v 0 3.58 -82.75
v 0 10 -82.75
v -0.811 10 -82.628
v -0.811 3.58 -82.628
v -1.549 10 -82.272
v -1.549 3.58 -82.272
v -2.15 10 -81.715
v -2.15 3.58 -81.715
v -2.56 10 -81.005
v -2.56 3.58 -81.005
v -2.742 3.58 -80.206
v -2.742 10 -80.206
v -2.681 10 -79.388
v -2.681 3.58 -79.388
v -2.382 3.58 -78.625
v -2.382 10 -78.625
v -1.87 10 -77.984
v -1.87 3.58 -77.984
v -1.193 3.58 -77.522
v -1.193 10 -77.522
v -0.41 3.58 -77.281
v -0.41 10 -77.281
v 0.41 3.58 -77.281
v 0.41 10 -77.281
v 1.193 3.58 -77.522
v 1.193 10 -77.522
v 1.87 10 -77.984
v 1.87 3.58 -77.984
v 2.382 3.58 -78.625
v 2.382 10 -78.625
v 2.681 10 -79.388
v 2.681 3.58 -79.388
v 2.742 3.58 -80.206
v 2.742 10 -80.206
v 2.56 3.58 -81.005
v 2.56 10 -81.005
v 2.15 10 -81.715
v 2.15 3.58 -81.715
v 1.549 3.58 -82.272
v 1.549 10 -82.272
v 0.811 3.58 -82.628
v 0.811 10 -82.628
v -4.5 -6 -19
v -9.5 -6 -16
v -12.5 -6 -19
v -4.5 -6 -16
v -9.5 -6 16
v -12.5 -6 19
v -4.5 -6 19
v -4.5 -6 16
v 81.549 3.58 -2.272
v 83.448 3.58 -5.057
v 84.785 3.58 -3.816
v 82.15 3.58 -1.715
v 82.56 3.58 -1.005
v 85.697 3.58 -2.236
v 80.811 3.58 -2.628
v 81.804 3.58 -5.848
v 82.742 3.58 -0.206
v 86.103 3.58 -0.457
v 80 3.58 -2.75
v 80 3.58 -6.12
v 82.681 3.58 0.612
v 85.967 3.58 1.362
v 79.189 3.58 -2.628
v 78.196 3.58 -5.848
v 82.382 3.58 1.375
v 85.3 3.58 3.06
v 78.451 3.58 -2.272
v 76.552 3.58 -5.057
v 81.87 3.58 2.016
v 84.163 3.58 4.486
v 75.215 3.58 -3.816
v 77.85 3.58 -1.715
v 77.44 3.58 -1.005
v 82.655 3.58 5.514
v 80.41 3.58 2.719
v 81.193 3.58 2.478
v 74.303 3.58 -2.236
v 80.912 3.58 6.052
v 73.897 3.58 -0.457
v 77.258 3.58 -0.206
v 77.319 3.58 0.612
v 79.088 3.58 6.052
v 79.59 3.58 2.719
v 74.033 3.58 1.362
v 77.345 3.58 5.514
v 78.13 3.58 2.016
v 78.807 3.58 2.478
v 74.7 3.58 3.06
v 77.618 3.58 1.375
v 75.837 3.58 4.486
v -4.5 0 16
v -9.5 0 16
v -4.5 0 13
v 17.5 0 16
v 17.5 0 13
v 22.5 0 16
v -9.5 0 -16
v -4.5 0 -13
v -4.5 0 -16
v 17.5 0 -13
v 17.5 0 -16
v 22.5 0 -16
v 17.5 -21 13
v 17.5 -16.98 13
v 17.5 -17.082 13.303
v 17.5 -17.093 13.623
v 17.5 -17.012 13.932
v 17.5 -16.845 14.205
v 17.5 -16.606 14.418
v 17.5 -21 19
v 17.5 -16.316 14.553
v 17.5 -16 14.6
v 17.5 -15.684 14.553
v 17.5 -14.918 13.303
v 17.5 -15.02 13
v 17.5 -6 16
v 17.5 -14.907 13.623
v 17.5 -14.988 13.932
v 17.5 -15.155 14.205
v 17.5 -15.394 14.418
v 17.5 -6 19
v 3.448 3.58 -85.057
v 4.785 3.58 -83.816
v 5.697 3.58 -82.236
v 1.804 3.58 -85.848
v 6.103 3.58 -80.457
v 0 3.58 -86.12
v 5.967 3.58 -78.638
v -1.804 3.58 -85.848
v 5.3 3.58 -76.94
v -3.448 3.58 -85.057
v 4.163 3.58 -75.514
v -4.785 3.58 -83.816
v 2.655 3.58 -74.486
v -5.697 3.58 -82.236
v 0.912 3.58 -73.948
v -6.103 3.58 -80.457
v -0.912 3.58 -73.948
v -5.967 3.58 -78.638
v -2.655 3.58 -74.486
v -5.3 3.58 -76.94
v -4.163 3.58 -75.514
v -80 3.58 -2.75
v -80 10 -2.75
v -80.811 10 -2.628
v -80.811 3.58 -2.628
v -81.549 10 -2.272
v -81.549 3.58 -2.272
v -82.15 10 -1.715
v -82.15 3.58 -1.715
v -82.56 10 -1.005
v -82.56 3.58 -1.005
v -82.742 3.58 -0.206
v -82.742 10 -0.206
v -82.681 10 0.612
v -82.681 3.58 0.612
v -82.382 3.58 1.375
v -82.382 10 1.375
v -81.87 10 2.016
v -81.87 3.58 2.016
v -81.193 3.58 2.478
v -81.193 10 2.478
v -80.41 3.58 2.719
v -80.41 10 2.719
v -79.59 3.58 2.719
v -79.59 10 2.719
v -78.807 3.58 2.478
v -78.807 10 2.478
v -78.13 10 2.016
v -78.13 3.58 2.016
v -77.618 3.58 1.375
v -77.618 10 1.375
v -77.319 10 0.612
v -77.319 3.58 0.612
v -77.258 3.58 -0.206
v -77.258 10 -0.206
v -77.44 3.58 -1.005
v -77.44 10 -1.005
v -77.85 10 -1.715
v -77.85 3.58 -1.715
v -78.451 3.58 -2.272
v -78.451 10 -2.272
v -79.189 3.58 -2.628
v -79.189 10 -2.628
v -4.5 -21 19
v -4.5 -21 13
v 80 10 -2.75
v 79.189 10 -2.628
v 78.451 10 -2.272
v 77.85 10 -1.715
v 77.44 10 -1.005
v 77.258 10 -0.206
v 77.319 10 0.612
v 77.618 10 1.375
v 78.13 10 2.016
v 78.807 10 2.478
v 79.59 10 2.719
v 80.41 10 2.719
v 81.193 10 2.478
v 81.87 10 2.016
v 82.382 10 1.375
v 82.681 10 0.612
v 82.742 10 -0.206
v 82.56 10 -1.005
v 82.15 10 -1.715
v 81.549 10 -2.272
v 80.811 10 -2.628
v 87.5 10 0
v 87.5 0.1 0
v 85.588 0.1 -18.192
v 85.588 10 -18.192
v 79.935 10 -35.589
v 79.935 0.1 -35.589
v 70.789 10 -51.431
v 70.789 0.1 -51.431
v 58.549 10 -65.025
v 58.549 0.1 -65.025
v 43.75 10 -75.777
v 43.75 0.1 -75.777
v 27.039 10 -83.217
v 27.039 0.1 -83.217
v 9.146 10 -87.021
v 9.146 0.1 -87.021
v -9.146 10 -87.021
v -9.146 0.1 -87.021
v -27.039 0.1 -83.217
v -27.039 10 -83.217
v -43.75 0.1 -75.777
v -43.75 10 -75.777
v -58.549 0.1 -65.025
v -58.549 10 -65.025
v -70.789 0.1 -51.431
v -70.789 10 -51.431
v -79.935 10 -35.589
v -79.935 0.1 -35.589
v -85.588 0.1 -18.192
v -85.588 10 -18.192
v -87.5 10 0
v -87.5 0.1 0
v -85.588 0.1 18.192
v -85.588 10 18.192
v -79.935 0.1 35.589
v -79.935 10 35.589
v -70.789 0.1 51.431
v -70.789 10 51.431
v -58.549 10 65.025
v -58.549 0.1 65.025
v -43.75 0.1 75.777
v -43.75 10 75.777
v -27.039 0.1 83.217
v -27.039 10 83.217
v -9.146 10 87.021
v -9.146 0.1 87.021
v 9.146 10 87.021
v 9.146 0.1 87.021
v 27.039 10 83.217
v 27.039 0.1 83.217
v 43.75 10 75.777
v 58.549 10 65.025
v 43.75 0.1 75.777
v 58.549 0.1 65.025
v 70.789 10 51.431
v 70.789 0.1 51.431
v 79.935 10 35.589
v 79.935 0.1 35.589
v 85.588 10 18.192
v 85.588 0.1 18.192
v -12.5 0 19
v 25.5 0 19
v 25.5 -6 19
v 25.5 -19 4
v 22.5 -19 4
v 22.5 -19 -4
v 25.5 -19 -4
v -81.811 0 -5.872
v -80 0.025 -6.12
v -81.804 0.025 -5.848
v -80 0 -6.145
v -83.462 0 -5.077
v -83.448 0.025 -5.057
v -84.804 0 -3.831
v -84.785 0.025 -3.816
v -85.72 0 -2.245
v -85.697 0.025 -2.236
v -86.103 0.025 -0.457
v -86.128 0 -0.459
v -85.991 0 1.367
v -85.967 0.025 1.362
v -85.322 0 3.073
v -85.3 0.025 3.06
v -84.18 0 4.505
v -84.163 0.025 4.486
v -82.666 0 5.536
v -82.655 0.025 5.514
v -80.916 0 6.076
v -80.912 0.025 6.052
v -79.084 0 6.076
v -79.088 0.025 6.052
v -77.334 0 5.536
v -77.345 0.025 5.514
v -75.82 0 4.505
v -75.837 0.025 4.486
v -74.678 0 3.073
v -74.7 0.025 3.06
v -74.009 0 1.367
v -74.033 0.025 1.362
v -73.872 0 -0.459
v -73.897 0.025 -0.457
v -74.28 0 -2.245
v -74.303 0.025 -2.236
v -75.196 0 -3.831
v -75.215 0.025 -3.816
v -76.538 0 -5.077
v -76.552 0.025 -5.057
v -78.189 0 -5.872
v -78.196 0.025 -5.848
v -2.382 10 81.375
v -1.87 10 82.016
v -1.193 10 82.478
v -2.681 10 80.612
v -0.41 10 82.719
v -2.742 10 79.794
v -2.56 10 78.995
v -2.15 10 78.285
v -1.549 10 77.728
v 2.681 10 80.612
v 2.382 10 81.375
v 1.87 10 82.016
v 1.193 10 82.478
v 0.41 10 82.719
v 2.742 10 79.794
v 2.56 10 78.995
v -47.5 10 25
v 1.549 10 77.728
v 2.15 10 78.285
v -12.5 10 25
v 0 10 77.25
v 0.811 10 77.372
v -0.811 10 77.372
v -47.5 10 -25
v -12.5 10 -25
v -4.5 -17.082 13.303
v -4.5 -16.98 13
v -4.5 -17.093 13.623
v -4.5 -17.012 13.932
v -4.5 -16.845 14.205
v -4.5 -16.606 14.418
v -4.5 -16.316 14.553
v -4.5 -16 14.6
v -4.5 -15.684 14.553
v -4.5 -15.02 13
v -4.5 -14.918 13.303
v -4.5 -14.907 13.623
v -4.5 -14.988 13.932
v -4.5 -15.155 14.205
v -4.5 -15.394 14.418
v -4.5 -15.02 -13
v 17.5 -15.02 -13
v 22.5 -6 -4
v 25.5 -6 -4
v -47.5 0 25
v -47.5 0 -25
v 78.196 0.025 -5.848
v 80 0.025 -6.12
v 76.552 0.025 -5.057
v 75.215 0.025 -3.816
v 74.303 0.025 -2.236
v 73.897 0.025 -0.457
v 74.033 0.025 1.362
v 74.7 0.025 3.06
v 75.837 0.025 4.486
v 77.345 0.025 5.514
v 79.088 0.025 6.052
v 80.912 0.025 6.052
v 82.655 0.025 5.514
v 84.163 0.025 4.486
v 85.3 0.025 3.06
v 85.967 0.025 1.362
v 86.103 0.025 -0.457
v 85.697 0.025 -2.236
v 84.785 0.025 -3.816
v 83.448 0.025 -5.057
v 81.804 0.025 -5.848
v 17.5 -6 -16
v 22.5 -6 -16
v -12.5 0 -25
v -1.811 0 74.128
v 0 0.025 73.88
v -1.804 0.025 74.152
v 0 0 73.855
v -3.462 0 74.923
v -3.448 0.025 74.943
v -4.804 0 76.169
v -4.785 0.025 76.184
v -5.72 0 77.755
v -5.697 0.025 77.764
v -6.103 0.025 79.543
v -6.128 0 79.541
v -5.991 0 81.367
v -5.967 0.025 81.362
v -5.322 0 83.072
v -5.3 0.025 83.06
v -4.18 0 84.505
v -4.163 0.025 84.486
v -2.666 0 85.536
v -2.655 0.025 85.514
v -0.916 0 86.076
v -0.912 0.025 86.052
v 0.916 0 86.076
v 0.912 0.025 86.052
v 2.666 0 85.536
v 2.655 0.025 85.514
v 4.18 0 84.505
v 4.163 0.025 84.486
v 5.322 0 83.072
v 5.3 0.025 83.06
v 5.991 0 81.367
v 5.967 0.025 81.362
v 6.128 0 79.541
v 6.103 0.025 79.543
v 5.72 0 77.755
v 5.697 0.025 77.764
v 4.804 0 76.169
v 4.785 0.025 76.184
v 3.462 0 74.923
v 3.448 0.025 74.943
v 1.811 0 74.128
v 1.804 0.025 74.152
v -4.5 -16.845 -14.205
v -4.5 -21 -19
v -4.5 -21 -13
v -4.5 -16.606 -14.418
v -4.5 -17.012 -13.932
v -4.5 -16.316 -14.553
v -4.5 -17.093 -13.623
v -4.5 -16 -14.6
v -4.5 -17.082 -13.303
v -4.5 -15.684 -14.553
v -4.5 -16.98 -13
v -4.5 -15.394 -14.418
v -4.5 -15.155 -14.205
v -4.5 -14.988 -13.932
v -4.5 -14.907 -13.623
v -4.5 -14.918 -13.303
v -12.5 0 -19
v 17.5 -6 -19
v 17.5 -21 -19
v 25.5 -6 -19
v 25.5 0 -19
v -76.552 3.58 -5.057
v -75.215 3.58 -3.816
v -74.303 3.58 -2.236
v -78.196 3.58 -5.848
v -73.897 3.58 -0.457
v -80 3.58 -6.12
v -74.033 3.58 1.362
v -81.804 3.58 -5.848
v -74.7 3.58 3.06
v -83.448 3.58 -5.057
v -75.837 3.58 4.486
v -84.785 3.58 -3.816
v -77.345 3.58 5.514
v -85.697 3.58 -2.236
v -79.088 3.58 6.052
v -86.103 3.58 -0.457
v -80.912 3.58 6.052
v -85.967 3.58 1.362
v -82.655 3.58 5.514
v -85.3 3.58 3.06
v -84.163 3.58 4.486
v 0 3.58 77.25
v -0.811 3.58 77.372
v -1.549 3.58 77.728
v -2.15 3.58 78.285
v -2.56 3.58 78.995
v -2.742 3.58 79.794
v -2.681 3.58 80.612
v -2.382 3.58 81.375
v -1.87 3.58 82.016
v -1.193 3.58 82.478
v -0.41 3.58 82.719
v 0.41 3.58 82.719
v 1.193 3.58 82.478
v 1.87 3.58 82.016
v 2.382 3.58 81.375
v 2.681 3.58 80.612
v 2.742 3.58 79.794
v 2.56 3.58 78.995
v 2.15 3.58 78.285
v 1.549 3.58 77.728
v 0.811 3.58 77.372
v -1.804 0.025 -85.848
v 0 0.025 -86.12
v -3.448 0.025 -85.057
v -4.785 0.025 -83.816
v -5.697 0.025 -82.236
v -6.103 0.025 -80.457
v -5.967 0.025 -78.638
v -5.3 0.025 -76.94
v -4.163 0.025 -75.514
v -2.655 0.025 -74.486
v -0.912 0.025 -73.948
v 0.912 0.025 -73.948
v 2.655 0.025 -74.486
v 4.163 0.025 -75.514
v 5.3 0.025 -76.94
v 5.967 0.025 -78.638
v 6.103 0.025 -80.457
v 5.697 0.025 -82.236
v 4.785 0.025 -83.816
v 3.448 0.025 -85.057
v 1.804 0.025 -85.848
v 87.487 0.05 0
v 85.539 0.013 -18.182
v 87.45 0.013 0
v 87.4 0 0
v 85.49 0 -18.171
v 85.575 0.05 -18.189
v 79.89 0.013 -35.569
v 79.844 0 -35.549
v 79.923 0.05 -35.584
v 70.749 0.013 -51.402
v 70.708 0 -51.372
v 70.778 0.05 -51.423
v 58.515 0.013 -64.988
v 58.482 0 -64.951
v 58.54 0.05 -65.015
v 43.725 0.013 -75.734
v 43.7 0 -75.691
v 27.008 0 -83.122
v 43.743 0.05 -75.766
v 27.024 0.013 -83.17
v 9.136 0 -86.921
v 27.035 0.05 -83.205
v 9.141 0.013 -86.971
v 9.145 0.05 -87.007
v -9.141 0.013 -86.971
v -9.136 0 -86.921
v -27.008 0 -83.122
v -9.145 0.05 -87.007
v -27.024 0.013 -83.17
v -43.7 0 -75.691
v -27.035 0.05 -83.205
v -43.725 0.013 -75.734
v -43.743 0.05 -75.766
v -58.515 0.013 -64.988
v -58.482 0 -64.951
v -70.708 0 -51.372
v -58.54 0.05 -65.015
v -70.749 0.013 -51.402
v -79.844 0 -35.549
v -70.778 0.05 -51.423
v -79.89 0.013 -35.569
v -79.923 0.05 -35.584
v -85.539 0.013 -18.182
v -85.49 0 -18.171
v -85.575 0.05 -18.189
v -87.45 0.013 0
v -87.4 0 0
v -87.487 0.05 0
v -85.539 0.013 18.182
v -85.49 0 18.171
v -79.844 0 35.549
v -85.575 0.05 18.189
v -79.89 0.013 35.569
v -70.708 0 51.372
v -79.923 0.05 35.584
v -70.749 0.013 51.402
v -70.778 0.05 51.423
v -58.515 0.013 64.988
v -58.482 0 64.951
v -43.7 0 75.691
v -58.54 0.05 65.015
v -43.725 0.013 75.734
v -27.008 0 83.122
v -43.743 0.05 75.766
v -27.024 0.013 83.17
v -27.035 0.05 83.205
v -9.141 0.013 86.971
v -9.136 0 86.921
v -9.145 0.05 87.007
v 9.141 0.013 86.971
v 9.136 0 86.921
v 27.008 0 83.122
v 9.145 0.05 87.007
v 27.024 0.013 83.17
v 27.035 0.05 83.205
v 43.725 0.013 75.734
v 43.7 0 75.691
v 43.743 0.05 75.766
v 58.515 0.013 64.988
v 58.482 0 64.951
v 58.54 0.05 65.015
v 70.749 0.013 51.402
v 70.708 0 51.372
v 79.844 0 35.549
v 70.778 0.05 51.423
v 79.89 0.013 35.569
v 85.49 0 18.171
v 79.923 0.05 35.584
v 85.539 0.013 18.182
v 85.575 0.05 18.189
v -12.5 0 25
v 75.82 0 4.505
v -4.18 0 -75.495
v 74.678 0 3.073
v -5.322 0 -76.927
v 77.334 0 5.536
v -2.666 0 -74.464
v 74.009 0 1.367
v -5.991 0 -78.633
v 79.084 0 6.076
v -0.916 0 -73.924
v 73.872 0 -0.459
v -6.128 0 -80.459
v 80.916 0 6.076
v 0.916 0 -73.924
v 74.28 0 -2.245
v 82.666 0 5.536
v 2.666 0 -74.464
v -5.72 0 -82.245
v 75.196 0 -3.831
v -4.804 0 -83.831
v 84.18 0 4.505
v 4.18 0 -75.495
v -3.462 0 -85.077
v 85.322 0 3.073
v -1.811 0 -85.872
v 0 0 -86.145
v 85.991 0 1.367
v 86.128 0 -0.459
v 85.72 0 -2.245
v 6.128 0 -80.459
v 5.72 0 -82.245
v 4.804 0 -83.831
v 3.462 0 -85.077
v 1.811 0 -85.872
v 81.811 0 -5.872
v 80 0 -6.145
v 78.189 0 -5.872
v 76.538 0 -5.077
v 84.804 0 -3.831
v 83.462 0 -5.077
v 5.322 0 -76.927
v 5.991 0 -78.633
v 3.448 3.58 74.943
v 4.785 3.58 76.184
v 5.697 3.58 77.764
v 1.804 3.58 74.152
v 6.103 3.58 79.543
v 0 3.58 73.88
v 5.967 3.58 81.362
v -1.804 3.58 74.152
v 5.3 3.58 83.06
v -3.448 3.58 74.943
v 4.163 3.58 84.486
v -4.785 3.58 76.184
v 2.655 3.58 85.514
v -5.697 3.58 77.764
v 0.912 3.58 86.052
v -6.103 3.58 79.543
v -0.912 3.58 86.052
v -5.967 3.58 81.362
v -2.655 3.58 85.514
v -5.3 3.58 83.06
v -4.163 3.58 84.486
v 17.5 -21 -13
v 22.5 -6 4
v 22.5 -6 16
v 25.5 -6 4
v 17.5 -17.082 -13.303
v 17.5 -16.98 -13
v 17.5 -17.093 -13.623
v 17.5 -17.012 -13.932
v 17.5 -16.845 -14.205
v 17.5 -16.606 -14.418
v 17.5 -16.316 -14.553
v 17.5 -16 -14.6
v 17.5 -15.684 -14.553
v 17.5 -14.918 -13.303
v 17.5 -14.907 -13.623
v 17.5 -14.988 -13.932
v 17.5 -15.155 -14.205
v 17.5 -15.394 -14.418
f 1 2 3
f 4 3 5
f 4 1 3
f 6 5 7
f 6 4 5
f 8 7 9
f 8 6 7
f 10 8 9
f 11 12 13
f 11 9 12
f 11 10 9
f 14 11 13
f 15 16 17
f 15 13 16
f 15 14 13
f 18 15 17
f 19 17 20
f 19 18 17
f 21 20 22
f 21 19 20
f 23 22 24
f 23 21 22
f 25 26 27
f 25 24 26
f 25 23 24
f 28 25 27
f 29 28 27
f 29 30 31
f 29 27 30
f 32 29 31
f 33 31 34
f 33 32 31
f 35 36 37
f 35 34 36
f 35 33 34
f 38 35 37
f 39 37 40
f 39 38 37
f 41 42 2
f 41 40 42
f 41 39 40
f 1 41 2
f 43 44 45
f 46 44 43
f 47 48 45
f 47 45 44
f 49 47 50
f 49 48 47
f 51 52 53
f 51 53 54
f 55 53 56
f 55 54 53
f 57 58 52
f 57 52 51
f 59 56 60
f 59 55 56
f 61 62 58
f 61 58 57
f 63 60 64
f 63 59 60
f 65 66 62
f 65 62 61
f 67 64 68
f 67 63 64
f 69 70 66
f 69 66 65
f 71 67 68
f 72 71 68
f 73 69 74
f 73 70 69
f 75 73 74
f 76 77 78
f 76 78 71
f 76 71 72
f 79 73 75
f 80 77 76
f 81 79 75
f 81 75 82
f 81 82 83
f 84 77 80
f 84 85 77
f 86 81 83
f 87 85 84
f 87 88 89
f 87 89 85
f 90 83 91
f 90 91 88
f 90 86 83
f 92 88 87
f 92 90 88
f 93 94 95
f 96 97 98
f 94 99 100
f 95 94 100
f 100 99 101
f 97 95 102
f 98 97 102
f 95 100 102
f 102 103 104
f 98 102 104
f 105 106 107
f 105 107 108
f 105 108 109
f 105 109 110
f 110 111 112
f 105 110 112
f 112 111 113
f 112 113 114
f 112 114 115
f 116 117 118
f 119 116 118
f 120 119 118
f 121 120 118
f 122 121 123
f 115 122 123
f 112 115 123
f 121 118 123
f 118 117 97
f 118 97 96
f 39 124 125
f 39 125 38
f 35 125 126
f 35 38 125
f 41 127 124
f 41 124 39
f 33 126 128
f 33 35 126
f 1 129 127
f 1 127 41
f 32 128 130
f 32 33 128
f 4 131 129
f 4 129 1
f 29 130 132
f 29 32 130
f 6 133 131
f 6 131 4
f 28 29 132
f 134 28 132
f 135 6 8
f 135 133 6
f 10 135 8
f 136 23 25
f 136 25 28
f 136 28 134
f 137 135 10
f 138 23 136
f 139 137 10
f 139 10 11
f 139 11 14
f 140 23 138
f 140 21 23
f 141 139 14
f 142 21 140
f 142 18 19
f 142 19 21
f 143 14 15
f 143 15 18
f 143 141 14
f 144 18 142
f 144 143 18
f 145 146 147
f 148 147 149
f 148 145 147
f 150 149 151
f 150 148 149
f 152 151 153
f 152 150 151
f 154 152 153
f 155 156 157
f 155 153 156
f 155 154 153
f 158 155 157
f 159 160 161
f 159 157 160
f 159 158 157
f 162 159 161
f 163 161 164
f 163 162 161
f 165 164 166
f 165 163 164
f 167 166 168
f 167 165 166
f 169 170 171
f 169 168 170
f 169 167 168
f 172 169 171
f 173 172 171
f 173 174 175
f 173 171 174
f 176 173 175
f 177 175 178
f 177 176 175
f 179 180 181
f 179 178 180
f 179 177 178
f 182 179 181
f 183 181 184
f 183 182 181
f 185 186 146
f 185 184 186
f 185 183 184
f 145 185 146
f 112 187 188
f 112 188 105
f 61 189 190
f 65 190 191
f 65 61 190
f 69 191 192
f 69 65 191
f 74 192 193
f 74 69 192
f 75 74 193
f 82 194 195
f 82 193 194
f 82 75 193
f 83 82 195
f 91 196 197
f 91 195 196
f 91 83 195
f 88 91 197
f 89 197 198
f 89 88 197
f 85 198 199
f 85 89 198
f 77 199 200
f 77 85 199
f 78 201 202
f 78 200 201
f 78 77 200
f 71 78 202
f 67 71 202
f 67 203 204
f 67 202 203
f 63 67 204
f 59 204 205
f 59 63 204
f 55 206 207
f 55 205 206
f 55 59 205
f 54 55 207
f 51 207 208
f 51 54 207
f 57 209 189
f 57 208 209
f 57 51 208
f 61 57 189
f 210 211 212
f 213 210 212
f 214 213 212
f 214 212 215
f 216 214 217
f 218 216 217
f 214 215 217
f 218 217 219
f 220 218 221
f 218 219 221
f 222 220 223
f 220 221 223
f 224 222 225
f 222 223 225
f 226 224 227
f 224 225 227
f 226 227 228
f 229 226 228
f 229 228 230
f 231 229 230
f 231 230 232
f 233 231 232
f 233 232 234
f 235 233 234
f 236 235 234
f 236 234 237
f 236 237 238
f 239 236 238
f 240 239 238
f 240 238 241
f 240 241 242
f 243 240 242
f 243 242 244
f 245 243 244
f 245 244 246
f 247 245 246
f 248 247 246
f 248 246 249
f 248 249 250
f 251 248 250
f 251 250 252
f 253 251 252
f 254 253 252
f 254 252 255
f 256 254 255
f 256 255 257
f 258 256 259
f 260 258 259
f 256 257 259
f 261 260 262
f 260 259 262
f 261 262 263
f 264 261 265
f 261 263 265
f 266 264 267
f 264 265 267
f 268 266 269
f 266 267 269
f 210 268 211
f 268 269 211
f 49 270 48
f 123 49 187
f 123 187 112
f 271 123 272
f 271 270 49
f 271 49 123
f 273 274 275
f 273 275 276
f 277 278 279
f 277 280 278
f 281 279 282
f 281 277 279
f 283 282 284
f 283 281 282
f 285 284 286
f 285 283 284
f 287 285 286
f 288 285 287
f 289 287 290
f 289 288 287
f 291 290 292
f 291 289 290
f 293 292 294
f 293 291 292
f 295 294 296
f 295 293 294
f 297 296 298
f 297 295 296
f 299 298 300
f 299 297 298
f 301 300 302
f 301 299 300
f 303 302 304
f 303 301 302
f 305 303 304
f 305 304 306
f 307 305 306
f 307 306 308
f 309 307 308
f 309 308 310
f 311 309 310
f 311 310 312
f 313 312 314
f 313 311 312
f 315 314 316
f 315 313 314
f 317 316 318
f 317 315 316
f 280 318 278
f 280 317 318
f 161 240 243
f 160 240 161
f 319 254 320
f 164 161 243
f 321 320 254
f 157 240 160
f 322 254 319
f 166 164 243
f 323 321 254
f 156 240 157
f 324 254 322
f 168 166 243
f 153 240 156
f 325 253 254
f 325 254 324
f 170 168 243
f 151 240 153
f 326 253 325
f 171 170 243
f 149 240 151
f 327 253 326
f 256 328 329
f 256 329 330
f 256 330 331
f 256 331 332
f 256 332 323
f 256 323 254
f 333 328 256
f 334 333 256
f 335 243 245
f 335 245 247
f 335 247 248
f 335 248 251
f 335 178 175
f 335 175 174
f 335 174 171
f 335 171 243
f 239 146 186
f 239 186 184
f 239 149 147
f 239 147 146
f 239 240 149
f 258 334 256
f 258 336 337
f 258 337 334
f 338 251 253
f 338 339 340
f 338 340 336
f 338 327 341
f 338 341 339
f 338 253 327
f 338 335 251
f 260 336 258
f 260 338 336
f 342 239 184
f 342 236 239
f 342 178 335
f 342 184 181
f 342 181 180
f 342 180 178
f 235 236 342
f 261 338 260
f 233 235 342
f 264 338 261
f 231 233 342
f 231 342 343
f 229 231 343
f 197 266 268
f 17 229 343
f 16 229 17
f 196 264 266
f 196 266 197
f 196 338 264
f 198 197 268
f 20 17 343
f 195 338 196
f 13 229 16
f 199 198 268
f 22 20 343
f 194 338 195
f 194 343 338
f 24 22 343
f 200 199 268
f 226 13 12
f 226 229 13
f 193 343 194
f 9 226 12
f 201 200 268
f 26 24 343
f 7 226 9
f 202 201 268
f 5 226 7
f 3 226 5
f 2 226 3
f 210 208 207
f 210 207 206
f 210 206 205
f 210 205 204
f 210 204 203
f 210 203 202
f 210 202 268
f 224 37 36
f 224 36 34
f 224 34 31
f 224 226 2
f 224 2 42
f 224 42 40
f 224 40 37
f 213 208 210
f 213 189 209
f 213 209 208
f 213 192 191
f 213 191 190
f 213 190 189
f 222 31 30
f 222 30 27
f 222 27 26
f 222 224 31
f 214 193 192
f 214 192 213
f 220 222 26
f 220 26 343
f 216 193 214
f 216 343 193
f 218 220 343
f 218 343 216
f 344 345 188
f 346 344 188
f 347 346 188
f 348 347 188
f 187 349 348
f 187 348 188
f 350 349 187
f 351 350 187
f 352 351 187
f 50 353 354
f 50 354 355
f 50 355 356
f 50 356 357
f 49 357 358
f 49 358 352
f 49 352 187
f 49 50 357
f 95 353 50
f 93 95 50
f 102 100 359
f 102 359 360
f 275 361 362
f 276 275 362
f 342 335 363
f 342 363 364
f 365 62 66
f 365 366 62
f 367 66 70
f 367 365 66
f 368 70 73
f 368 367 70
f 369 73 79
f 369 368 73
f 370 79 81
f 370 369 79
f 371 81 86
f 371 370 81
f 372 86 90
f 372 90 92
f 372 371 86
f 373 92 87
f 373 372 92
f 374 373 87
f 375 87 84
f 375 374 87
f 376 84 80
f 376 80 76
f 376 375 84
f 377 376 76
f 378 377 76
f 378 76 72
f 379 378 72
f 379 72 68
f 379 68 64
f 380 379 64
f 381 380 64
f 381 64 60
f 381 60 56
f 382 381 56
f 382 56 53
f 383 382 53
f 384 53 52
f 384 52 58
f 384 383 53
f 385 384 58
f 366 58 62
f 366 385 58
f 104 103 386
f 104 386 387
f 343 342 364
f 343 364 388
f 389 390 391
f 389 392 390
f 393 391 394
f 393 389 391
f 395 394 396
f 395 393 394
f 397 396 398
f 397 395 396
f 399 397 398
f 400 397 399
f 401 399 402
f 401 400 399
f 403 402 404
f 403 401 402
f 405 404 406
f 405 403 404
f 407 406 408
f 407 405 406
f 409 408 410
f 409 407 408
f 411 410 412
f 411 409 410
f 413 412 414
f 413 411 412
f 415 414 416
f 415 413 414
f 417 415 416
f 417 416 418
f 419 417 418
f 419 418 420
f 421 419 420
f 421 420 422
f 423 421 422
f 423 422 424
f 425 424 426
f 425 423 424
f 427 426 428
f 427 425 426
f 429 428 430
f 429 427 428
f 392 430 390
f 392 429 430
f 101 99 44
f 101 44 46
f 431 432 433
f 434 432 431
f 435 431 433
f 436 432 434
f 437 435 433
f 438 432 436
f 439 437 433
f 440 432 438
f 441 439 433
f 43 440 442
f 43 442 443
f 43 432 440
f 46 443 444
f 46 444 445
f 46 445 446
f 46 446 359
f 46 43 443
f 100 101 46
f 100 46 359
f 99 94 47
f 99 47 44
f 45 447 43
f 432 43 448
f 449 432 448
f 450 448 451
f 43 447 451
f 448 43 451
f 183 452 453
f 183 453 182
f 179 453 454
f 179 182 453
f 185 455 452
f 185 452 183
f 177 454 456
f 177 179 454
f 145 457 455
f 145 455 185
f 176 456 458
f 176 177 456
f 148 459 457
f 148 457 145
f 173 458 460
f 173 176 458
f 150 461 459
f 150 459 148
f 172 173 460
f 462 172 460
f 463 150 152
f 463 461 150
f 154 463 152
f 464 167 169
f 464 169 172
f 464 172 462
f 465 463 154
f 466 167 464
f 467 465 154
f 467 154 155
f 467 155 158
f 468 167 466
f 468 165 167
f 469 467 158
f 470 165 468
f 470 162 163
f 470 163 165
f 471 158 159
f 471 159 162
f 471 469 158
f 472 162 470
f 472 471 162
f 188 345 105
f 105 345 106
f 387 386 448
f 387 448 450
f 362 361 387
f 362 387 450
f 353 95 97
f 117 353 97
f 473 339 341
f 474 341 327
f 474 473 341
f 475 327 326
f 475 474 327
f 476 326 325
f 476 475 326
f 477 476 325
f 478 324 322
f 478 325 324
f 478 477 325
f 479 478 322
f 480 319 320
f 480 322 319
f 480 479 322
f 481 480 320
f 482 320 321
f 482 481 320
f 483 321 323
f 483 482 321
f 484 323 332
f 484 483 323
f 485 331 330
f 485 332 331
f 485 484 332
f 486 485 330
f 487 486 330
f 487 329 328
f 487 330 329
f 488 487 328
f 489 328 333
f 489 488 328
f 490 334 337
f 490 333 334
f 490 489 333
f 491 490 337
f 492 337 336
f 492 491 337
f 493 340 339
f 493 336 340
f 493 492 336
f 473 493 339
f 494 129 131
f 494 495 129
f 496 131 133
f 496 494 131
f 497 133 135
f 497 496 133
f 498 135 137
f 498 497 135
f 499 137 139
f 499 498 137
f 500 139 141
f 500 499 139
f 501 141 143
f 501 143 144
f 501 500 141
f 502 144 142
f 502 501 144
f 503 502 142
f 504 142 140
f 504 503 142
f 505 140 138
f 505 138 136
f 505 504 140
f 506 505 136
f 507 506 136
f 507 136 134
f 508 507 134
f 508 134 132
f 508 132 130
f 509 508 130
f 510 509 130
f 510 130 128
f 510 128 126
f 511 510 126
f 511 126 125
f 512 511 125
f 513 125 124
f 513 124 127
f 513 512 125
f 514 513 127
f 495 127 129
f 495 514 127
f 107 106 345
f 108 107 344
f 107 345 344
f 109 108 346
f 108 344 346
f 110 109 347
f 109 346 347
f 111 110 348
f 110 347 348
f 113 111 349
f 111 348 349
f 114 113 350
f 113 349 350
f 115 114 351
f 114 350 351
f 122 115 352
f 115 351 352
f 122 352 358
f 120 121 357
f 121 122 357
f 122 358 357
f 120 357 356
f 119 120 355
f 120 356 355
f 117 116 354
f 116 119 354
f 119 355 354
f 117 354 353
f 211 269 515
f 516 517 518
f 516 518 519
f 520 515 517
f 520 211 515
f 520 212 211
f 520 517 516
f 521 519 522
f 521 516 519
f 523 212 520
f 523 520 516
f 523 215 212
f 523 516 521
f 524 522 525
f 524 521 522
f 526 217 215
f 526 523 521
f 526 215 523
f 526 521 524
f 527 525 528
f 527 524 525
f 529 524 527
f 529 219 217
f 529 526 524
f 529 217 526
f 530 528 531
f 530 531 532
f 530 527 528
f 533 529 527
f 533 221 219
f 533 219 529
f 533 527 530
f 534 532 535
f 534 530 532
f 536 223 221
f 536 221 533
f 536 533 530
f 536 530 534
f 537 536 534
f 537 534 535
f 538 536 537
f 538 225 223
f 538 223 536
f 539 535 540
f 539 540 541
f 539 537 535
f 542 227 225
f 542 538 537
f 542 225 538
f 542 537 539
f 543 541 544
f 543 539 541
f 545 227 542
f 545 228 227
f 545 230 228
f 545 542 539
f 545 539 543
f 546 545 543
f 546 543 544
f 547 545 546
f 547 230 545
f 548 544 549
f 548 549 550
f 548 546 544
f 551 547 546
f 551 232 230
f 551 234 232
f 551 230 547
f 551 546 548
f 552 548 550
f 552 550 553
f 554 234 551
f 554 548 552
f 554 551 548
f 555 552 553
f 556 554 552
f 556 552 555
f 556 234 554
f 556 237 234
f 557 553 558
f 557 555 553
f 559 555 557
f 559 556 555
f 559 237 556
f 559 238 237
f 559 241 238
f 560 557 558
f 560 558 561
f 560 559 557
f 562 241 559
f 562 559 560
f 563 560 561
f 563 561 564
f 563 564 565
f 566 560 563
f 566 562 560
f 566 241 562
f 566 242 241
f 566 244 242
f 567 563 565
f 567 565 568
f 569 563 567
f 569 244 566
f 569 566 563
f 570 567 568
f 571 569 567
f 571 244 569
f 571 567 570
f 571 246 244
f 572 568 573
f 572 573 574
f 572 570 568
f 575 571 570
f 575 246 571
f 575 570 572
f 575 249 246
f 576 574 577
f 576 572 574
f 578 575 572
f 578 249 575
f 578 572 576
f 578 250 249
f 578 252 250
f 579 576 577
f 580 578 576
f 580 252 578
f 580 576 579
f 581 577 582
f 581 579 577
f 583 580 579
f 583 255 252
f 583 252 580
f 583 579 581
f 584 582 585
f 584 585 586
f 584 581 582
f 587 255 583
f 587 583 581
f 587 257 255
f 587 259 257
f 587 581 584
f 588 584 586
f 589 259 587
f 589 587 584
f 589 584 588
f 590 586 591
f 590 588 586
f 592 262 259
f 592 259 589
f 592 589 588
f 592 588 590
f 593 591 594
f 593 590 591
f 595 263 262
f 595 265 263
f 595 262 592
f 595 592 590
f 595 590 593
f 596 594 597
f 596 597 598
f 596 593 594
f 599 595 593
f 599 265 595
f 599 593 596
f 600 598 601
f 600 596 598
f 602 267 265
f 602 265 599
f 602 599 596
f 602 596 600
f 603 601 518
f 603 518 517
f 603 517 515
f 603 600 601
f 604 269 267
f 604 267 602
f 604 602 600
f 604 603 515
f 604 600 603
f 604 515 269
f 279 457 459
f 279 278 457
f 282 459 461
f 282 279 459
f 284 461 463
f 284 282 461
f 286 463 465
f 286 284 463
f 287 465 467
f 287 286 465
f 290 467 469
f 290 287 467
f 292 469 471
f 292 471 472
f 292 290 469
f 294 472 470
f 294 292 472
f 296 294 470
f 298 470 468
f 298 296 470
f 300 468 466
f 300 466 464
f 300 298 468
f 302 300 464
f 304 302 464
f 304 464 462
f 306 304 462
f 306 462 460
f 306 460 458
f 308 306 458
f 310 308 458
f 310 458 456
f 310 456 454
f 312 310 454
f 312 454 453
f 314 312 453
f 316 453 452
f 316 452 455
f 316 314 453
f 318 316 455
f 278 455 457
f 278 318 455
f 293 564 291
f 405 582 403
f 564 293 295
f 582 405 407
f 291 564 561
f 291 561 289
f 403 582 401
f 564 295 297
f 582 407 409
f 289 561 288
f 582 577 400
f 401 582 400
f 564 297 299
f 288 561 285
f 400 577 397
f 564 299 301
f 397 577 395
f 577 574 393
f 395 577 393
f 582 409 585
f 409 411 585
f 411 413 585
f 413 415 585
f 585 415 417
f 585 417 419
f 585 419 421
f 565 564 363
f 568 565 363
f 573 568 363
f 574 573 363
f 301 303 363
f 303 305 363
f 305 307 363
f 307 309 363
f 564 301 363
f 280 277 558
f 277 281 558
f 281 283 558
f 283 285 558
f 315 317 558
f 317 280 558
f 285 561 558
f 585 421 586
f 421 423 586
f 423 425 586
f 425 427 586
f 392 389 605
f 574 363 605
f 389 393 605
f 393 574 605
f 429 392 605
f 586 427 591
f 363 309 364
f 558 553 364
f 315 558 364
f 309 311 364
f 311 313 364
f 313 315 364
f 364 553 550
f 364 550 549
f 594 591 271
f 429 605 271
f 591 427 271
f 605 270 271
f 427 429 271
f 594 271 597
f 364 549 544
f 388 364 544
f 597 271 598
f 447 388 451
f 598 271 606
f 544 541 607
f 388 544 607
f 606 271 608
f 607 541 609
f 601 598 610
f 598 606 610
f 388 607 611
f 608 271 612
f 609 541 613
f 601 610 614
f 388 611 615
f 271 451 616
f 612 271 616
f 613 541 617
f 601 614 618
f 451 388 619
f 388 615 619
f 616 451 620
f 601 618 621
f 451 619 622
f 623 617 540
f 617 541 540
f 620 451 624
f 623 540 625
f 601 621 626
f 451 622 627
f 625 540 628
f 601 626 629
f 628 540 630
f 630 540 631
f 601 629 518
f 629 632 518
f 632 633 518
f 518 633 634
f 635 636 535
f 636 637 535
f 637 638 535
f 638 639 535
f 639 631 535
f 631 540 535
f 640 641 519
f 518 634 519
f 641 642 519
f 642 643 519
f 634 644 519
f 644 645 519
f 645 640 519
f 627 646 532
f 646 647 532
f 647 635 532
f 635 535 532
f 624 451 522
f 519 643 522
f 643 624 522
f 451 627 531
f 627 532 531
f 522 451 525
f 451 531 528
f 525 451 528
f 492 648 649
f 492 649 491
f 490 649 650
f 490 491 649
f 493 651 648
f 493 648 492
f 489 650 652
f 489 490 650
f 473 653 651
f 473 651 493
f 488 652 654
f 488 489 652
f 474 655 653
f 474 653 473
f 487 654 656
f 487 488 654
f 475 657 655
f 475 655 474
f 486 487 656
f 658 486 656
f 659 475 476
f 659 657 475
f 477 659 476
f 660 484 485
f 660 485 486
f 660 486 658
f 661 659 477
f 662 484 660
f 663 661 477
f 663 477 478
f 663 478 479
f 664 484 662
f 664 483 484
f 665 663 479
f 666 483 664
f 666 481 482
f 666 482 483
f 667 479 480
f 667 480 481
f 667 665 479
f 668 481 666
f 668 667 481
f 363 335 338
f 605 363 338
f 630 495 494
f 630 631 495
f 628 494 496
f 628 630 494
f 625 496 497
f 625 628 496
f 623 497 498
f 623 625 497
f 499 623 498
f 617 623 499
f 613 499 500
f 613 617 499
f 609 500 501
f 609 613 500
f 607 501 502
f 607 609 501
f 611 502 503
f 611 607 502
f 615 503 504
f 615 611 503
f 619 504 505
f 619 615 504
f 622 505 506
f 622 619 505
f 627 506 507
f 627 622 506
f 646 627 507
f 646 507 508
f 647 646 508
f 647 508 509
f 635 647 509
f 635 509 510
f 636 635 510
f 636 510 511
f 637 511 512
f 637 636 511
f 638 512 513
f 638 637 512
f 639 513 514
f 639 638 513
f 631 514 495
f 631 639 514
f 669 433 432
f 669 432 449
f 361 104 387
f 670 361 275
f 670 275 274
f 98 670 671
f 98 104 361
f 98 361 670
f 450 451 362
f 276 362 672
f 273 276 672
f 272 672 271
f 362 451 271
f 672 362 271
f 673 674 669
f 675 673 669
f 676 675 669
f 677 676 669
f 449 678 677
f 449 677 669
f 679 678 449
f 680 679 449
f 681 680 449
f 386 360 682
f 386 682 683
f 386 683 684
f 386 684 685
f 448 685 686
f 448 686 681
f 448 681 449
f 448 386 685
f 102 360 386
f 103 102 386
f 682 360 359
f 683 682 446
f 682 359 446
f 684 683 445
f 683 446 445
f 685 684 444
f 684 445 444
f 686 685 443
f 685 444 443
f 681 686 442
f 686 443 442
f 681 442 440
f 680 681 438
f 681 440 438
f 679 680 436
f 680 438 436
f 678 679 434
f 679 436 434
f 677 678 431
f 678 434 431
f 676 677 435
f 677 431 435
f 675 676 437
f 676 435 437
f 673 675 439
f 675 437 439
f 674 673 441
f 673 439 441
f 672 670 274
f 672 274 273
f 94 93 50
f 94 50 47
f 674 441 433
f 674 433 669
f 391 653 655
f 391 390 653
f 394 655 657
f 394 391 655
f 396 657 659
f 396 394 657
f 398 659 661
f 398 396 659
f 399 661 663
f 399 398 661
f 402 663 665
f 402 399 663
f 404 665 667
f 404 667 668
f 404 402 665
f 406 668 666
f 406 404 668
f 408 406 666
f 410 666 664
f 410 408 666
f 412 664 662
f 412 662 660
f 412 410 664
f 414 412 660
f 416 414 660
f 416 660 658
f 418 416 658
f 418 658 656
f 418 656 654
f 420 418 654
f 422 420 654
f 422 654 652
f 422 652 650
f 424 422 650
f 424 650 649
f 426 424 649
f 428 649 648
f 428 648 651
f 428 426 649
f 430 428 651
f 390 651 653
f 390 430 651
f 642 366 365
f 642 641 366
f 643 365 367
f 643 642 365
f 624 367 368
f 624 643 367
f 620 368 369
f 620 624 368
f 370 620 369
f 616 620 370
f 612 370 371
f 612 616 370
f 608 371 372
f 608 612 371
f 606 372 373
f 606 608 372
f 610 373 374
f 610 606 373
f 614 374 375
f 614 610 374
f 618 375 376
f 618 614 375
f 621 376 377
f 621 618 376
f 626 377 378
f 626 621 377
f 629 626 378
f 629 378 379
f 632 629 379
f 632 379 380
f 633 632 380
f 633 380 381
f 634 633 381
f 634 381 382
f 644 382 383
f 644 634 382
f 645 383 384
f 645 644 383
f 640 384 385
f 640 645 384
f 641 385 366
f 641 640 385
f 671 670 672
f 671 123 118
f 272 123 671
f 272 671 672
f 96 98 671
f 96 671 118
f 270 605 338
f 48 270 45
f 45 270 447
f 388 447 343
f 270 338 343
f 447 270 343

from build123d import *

# Parameters (mm, degrees)
SKETCH1_R                              = 87.5
BOSS_EXTRUDE1_DEPTH                    = 10
SKETCH2_R                              = 7.5
BOSS_EXTRUDE2_DEPTH                    = 80
CBORE_FOR_M5_HEX_HEAD_BOLT1_AT_2_COUNT = 2
CBORE_FOR_M5_HEX_HEAD_BOLT1_AT_2_PITCH = 113.13708499
CBORE_FOR_M5_HEX_HEAD_BOLT1_AT_3_COUNT = 2
CBORE_FOR_M5_HEX_HEAD_BOLT1_AT_3_PITCH = 160
CBORE_FOR_M5_HEX_HEAD_BOLT1_AT_4_COUNT = 2
CBORE_FOR_M5_HEX_HEAD_BOLT1_AT_4_PITCH = 113.13708499
SKETCH5_R                              = 87.5
CUT_EXTRUDE1_DEPTH                     = 80
FILLET1_R                              = 0.1
SKETCH10_W                             = 35
SKETCH10_H                             = 50
CUT_EXTRUDE3_DEPTH                     = 23
SKETCH12_W                             = 38
SKETCH12_H                             = 38
BOSS_EXTRUDE3_DEPTH                    = 6
SKETCH13_W                             = 22
SKETCH13_H                             = 6
BOSS_EXTRUDE4_DEPTH                    = 15
SKETCH14_W                             = 3
SKETCH14_H                             = 8
BOSS_EXTRUDE5_DEPTH                    = 13
CUT_EXTRUDE4_DEPTH                     = 93.0000001


with BuildPart() as part:
    # Sketch1 → Boss-Extrude1 (new body)
    with BuildSketch(Plane(origin=(0, 0, 0), x_dir=(1, 0, 0), z_dir=(0, 1, 0))):
        Circle(SKETCH1_R)
    extrude(amount=BOSS_EXTRUDE1_DEPTH)

    # Sketch2 → Boss-Extrude2 (add)
    with BuildSketch(Plane(origin=(0, 10, 0), x_dir=(1, 0, 0), z_dir=(0, 1, 0))):
        with Locations((0, -80)):
            Circle(SKETCH2_R)
        with Locations((-80, 0)):
            Circle(SKETCH2_R)
        with Locations((0, 80)):
            Circle(SKETCH2_R)
        with Locations((80, 0)):
            Circle(SKETCH2_R)
    extrude(amount=BOSS_EXTRUDE2_DEPTH)

    # Sketch4 → CBORE for M5 Hex Head Bolt1 (revolve, cut)
    with BuildSketch(Plane(origin=(80, 0, 0), x_dir=(0, 0, -1), z_dir=(1, 0, 0))):
        Polygon((0, 0), (0, 21.652366702), (2.75, 20), (2.75, 3.58), (6.12, 3.58), (6.12, 0.025), (6.145, 0), align=None)
    cbore_for_m5_hex_head_bolt1 = revolve(axis=Axis((80, -6.35, 0), (0, 1, 0)), mode=Mode.SUBTRACT)

    # CBORE for M5 Hex Head Bolt1 at 2: CBORE for M5 Hex Head Bolt1 ×2
    with Locations(*[Vector(-0.707106781, 0, -0.707106781) * (i * CBORE_FOR_M5_HEX_HEAD_BOLT1_AT_2_PITCH) for i in range(1, CBORE_FOR_M5_HEX_HEAD_BOLT1_AT_2_COUNT)]):
        add(cbore_for_m5_hex_head_bolt1, mode=Mode.SUBTRACT)

    # CBORE for M5 Hex Head Bolt1 at 3: CBORE for M5 Hex Head Bolt1 ×2
    with Locations(*[(-i * CBORE_FOR_M5_HEX_HEAD_BOLT1_AT_3_PITCH, 0, 0) for i in range(1, CBORE_FOR_M5_HEX_HEAD_BOLT1_AT_3_COUNT)]):
        add(cbore_for_m5_hex_head_bolt1, mode=Mode.SUBTRACT)

    # CBORE for M5 Hex Head Bolt1 at 4: CBORE for M5 Hex Head Bolt1 ×2
    with Locations(*[Vector(-0.707106781, 0, 0.707106781) * (i * CBORE_FOR_M5_HEX_HEAD_BOLT1_AT_4_PITCH) for i in range(1, CBORE_FOR_M5_HEX_HEAD_BOLT1_AT_4_COUNT)]):
        add(cbore_for_m5_hex_head_bolt1, mode=Mode.SUBTRACT)

    # Sketch5 → Cut-Extrude1 (cut)
    with BuildSketch(Plane(origin=(0, 10, 0), x_dir=(1, 0, 0), z_dir=(0, 1, 0))):
        Circle(SKETCH5_R)
    extrude(amount=CUT_EXTRUDE1_DEPTH, mode=Mode.SUBTRACT)

    # Fillet1
    fillet1_edges = [part.edges().sort_by_distance(p)[0] for p in [
        (-87.5, 0, 0),
    ]]
    fillet(fillet1_edges, radius=FILLET1_R)

    # Sketch10 → Cut-Extrude3 (cut)
    with BuildSketch(Plane(origin=(0, 10, 0), x_dir=(1, 0, 0), z_dir=(0, 1, 0))):
        with Locations((-30, 0)):
            Rectangle(SKETCH10_W, SKETCH10_H)
    extrude(amount=-CUT_EXTRUDE3_DEPTH, mode=Mode.SUBTRACT)

    # Sketch12 → Boss-Extrude3 (add)
    with BuildSketch(Plane.XZ):
        with Locations((6.5, 0)):
            Rectangle(SKETCH12_W, SKETCH12_H)
        Polygon((22.5, 16), (17.5, 16), (17.5, 13), (-4.5, 13), (-4.5, 16), (-9.5, 16), (-9.5, -16), (-4.5, -16), (-4.5, -13), (17.5, -13), (17.5, -16), (22.5, -16), align=None, mode=Mode.SUBTRACT)
    extrude(amount=BOSS_EXTRUDE3_DEPTH)

    # Sketch13 → Boss-Extrude4 (add)
    with BuildSketch(Plane.XZ.offset(6)):
        with Locations((6.5, 16)):
            Rectangle(SKETCH13_W, SKETCH13_H)
        with Locations((6.5, -16)):
            Rectangle(SKETCH13_W, SKETCH13_H)
    extrude(amount=BOSS_EXTRUDE4_DEPTH)

    # Sketch14 → Boss-Extrude5 (add)
    with BuildSketch(Plane.XZ.offset(6)):
        with Locations((24, 0)):
            Rectangle(SKETCH14_W, SKETCH14_H)
    extrude(amount=BOSS_EXTRUDE5_DEPTH)

    # Sketch15 → Cut-Extrude4 (cut, through all)
    with BuildSketch(Plane.ZY.offset(4.5)):
        with BuildLine():
            ThreePointArc((-13.500000002, -17.1), (-12.4, -16.000000001), (-13.5, -14.9))
            ThreePointArc((-13.5, -14.9), (-14.6, -15.999999999), (-13.500000002, -17.1))
        make_face()
        with BuildLine():
            ThreePointArc((13.500000002, -17.1), (14.6, -15.999999999), (13.5, -14.9))
            ThreePointArc((13.5, -14.9), (12.4, -16.000000001), (13.500000002, -17.1))
        make_face()
    extrude(amount=-CUT_EXTRUDE4_DEPTH, mode=Mode.SUBTRACT)


solid = part.part
